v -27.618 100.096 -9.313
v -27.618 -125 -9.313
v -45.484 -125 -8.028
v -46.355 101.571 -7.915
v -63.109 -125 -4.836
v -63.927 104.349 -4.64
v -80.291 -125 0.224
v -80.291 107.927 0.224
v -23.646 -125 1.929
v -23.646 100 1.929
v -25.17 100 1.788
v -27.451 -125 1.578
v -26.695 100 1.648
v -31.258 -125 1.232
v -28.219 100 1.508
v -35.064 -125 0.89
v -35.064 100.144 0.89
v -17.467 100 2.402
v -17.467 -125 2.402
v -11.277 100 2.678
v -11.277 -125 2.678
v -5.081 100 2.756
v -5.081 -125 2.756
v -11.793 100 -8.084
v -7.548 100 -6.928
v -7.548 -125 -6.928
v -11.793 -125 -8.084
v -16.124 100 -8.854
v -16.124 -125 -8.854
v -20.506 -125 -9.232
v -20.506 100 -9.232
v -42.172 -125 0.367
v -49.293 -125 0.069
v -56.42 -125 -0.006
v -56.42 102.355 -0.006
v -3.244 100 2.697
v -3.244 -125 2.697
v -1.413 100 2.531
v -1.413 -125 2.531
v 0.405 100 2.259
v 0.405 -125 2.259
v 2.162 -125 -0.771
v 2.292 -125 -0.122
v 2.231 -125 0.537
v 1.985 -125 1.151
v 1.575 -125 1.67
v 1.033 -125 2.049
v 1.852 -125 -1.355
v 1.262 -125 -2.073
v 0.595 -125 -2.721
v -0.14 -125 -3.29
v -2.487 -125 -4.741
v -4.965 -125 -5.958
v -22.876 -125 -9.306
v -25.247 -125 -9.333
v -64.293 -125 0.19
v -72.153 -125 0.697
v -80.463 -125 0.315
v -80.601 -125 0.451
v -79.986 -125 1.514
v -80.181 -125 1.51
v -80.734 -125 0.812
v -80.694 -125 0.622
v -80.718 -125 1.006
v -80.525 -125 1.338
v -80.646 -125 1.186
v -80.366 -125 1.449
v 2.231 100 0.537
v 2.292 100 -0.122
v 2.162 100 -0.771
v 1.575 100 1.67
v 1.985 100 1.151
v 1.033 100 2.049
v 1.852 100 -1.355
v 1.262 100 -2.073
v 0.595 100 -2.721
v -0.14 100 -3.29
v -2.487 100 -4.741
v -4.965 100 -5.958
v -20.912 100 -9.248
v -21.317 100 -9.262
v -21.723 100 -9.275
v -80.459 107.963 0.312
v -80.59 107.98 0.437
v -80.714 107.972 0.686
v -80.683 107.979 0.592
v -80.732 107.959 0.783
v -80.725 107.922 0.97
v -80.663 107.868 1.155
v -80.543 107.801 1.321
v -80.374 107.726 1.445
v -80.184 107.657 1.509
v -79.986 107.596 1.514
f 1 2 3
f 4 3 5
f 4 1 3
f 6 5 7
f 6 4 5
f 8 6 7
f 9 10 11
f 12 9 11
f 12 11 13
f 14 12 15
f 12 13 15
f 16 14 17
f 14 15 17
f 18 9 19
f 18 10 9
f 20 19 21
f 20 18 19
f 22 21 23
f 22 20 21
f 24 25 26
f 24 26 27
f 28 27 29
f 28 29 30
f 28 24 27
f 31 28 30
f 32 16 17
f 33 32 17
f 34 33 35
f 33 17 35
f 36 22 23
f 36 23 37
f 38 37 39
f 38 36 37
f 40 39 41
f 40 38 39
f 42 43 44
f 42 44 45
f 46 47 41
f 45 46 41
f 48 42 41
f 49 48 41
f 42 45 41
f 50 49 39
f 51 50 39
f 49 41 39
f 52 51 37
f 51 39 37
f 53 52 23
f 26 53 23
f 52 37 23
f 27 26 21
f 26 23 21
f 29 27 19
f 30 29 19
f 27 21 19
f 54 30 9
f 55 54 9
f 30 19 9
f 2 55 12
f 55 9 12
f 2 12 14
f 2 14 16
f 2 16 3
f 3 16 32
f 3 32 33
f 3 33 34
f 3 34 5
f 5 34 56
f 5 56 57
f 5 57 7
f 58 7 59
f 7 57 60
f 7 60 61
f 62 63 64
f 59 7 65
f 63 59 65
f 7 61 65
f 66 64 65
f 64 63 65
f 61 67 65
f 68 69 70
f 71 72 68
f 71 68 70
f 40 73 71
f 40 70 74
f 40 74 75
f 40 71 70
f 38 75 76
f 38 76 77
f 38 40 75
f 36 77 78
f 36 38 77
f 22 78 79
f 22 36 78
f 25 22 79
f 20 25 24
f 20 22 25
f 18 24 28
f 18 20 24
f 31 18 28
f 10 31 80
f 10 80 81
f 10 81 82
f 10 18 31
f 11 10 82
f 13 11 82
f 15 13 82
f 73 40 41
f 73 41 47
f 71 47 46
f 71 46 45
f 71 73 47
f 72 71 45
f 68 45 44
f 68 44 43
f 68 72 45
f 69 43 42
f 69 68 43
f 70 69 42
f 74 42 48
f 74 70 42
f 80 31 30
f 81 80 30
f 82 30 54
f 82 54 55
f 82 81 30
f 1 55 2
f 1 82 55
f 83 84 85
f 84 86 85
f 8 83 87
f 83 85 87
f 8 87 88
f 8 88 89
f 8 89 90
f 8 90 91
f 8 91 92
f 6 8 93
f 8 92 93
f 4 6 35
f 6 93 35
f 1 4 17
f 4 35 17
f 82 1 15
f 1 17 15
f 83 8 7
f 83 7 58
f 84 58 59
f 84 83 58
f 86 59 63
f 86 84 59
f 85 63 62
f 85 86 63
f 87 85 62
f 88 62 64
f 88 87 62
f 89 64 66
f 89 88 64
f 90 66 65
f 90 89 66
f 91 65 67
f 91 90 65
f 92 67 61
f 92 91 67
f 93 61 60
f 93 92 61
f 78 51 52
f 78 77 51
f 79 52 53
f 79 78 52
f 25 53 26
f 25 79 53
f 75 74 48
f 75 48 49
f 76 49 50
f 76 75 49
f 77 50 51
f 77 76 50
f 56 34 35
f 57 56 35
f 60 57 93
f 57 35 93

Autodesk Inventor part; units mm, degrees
ref_plane "YZ Plane" through (0, 0, 0) normal (1, 0, 0) x (0, 1, 0)
ref_plane "XZ Plane" through (0, 0, 0) normal (0, 1, 0) x (-1, 0, 0)
ref_plane "XY Plane" through (0, 0, 0) normal (0, 0, 1) x (1, 0, 0)
sketch "スケッチ1" plane through (0, 0, 0) normal (0, 1, 0) x (-1, 0, 0)
  circle A0 centre (56.6667, -3.3333) radius 2 projected
  circle A1 centre (6.6667, -1.3333) radius 2 projected
  arc A2 (27.618, -9.313) -> (80.2911, 0.2239) centre (24.5838, 157.671) ccw projected
  arc A3 (20.5062, -9.2317) -> (27.618, -9.313) centre (25.435, 110.8283) ccw projected
  arc A4 (7.5483, -6.9284) -> (20.5062, -9.2317) centre (22.5133, 39.66) ccw projected
  arc A5 (0.14, -3.2897) -> (7.5483, -6.9284) centre (16.2383, 20.125) ccw projected
  arc A6 (-1.8521, -1.3552) -> (0.14, -3.2897) centre (4.8333, 3.5367) ccw projected
  arc A7 (-0.4054, 2.2589) -> (-1.8521, -1.3552) centre (0, 0) ccw projected
  arc A8 (5.081, 2.7563) -> (-0.4054, 2.2589) centre (5.1833, -28.88) ccw projected
  arc A9 (23.6457, 1.9287) -> (5.081, 2.7563) centre (5.71, -191.7767) ccw projected
  arc A10 (23.6457, 1.9287) -> (35.0642, 0.89) centre (351.2983, 3540.5833) ccw projected
  arc A11 (35.0642, 0.89) -> (56.4197, -0.0064) centre (55.24, 226.7233) ccw projected
  arc A12 (56.4197, -0.0064) -> (79.9865, 1.514) centre (55.3817, 199.4967) ccw projected
  arc A13 (80.2911, 0.2239) -> (79.9865, 1.514) centre (80.0687, 0.8524) ccw projected
extrude "押し出し1" add sketch "スケッチ1" along normal mid plane 250 contours A0 | A1 | A3 A4 A5 A6 A7 A8 A9 A10 A11 A12 A13 A2
ref_plane "作業平面1" through (-121.5758, 135, -17.9326) normal (0.516, 0, -0.8566) x (0.8566, 0, 0.516)
sketch "スケッチ4" plane through (-121.5758, 135, -17.9326) normal (0.516, 0, -0.8566) x (0.8566, 0, 0.516)
  arc A0 (90, 35) -> (0, 0) centre (90, -98.2143) ccw projected
  line L0 (183.3333, 35) -> (90, 35) projected
  line L1 (183.3333, 35) -> (183.3333, 0)
  line L2 (183.3333, 0) -> (0, 0)
  point P0 (113.3913, 135)
extrude "押し出し4" cut sketch "スケッチ4" along normal through all
properties part number "newsubflap_top"
